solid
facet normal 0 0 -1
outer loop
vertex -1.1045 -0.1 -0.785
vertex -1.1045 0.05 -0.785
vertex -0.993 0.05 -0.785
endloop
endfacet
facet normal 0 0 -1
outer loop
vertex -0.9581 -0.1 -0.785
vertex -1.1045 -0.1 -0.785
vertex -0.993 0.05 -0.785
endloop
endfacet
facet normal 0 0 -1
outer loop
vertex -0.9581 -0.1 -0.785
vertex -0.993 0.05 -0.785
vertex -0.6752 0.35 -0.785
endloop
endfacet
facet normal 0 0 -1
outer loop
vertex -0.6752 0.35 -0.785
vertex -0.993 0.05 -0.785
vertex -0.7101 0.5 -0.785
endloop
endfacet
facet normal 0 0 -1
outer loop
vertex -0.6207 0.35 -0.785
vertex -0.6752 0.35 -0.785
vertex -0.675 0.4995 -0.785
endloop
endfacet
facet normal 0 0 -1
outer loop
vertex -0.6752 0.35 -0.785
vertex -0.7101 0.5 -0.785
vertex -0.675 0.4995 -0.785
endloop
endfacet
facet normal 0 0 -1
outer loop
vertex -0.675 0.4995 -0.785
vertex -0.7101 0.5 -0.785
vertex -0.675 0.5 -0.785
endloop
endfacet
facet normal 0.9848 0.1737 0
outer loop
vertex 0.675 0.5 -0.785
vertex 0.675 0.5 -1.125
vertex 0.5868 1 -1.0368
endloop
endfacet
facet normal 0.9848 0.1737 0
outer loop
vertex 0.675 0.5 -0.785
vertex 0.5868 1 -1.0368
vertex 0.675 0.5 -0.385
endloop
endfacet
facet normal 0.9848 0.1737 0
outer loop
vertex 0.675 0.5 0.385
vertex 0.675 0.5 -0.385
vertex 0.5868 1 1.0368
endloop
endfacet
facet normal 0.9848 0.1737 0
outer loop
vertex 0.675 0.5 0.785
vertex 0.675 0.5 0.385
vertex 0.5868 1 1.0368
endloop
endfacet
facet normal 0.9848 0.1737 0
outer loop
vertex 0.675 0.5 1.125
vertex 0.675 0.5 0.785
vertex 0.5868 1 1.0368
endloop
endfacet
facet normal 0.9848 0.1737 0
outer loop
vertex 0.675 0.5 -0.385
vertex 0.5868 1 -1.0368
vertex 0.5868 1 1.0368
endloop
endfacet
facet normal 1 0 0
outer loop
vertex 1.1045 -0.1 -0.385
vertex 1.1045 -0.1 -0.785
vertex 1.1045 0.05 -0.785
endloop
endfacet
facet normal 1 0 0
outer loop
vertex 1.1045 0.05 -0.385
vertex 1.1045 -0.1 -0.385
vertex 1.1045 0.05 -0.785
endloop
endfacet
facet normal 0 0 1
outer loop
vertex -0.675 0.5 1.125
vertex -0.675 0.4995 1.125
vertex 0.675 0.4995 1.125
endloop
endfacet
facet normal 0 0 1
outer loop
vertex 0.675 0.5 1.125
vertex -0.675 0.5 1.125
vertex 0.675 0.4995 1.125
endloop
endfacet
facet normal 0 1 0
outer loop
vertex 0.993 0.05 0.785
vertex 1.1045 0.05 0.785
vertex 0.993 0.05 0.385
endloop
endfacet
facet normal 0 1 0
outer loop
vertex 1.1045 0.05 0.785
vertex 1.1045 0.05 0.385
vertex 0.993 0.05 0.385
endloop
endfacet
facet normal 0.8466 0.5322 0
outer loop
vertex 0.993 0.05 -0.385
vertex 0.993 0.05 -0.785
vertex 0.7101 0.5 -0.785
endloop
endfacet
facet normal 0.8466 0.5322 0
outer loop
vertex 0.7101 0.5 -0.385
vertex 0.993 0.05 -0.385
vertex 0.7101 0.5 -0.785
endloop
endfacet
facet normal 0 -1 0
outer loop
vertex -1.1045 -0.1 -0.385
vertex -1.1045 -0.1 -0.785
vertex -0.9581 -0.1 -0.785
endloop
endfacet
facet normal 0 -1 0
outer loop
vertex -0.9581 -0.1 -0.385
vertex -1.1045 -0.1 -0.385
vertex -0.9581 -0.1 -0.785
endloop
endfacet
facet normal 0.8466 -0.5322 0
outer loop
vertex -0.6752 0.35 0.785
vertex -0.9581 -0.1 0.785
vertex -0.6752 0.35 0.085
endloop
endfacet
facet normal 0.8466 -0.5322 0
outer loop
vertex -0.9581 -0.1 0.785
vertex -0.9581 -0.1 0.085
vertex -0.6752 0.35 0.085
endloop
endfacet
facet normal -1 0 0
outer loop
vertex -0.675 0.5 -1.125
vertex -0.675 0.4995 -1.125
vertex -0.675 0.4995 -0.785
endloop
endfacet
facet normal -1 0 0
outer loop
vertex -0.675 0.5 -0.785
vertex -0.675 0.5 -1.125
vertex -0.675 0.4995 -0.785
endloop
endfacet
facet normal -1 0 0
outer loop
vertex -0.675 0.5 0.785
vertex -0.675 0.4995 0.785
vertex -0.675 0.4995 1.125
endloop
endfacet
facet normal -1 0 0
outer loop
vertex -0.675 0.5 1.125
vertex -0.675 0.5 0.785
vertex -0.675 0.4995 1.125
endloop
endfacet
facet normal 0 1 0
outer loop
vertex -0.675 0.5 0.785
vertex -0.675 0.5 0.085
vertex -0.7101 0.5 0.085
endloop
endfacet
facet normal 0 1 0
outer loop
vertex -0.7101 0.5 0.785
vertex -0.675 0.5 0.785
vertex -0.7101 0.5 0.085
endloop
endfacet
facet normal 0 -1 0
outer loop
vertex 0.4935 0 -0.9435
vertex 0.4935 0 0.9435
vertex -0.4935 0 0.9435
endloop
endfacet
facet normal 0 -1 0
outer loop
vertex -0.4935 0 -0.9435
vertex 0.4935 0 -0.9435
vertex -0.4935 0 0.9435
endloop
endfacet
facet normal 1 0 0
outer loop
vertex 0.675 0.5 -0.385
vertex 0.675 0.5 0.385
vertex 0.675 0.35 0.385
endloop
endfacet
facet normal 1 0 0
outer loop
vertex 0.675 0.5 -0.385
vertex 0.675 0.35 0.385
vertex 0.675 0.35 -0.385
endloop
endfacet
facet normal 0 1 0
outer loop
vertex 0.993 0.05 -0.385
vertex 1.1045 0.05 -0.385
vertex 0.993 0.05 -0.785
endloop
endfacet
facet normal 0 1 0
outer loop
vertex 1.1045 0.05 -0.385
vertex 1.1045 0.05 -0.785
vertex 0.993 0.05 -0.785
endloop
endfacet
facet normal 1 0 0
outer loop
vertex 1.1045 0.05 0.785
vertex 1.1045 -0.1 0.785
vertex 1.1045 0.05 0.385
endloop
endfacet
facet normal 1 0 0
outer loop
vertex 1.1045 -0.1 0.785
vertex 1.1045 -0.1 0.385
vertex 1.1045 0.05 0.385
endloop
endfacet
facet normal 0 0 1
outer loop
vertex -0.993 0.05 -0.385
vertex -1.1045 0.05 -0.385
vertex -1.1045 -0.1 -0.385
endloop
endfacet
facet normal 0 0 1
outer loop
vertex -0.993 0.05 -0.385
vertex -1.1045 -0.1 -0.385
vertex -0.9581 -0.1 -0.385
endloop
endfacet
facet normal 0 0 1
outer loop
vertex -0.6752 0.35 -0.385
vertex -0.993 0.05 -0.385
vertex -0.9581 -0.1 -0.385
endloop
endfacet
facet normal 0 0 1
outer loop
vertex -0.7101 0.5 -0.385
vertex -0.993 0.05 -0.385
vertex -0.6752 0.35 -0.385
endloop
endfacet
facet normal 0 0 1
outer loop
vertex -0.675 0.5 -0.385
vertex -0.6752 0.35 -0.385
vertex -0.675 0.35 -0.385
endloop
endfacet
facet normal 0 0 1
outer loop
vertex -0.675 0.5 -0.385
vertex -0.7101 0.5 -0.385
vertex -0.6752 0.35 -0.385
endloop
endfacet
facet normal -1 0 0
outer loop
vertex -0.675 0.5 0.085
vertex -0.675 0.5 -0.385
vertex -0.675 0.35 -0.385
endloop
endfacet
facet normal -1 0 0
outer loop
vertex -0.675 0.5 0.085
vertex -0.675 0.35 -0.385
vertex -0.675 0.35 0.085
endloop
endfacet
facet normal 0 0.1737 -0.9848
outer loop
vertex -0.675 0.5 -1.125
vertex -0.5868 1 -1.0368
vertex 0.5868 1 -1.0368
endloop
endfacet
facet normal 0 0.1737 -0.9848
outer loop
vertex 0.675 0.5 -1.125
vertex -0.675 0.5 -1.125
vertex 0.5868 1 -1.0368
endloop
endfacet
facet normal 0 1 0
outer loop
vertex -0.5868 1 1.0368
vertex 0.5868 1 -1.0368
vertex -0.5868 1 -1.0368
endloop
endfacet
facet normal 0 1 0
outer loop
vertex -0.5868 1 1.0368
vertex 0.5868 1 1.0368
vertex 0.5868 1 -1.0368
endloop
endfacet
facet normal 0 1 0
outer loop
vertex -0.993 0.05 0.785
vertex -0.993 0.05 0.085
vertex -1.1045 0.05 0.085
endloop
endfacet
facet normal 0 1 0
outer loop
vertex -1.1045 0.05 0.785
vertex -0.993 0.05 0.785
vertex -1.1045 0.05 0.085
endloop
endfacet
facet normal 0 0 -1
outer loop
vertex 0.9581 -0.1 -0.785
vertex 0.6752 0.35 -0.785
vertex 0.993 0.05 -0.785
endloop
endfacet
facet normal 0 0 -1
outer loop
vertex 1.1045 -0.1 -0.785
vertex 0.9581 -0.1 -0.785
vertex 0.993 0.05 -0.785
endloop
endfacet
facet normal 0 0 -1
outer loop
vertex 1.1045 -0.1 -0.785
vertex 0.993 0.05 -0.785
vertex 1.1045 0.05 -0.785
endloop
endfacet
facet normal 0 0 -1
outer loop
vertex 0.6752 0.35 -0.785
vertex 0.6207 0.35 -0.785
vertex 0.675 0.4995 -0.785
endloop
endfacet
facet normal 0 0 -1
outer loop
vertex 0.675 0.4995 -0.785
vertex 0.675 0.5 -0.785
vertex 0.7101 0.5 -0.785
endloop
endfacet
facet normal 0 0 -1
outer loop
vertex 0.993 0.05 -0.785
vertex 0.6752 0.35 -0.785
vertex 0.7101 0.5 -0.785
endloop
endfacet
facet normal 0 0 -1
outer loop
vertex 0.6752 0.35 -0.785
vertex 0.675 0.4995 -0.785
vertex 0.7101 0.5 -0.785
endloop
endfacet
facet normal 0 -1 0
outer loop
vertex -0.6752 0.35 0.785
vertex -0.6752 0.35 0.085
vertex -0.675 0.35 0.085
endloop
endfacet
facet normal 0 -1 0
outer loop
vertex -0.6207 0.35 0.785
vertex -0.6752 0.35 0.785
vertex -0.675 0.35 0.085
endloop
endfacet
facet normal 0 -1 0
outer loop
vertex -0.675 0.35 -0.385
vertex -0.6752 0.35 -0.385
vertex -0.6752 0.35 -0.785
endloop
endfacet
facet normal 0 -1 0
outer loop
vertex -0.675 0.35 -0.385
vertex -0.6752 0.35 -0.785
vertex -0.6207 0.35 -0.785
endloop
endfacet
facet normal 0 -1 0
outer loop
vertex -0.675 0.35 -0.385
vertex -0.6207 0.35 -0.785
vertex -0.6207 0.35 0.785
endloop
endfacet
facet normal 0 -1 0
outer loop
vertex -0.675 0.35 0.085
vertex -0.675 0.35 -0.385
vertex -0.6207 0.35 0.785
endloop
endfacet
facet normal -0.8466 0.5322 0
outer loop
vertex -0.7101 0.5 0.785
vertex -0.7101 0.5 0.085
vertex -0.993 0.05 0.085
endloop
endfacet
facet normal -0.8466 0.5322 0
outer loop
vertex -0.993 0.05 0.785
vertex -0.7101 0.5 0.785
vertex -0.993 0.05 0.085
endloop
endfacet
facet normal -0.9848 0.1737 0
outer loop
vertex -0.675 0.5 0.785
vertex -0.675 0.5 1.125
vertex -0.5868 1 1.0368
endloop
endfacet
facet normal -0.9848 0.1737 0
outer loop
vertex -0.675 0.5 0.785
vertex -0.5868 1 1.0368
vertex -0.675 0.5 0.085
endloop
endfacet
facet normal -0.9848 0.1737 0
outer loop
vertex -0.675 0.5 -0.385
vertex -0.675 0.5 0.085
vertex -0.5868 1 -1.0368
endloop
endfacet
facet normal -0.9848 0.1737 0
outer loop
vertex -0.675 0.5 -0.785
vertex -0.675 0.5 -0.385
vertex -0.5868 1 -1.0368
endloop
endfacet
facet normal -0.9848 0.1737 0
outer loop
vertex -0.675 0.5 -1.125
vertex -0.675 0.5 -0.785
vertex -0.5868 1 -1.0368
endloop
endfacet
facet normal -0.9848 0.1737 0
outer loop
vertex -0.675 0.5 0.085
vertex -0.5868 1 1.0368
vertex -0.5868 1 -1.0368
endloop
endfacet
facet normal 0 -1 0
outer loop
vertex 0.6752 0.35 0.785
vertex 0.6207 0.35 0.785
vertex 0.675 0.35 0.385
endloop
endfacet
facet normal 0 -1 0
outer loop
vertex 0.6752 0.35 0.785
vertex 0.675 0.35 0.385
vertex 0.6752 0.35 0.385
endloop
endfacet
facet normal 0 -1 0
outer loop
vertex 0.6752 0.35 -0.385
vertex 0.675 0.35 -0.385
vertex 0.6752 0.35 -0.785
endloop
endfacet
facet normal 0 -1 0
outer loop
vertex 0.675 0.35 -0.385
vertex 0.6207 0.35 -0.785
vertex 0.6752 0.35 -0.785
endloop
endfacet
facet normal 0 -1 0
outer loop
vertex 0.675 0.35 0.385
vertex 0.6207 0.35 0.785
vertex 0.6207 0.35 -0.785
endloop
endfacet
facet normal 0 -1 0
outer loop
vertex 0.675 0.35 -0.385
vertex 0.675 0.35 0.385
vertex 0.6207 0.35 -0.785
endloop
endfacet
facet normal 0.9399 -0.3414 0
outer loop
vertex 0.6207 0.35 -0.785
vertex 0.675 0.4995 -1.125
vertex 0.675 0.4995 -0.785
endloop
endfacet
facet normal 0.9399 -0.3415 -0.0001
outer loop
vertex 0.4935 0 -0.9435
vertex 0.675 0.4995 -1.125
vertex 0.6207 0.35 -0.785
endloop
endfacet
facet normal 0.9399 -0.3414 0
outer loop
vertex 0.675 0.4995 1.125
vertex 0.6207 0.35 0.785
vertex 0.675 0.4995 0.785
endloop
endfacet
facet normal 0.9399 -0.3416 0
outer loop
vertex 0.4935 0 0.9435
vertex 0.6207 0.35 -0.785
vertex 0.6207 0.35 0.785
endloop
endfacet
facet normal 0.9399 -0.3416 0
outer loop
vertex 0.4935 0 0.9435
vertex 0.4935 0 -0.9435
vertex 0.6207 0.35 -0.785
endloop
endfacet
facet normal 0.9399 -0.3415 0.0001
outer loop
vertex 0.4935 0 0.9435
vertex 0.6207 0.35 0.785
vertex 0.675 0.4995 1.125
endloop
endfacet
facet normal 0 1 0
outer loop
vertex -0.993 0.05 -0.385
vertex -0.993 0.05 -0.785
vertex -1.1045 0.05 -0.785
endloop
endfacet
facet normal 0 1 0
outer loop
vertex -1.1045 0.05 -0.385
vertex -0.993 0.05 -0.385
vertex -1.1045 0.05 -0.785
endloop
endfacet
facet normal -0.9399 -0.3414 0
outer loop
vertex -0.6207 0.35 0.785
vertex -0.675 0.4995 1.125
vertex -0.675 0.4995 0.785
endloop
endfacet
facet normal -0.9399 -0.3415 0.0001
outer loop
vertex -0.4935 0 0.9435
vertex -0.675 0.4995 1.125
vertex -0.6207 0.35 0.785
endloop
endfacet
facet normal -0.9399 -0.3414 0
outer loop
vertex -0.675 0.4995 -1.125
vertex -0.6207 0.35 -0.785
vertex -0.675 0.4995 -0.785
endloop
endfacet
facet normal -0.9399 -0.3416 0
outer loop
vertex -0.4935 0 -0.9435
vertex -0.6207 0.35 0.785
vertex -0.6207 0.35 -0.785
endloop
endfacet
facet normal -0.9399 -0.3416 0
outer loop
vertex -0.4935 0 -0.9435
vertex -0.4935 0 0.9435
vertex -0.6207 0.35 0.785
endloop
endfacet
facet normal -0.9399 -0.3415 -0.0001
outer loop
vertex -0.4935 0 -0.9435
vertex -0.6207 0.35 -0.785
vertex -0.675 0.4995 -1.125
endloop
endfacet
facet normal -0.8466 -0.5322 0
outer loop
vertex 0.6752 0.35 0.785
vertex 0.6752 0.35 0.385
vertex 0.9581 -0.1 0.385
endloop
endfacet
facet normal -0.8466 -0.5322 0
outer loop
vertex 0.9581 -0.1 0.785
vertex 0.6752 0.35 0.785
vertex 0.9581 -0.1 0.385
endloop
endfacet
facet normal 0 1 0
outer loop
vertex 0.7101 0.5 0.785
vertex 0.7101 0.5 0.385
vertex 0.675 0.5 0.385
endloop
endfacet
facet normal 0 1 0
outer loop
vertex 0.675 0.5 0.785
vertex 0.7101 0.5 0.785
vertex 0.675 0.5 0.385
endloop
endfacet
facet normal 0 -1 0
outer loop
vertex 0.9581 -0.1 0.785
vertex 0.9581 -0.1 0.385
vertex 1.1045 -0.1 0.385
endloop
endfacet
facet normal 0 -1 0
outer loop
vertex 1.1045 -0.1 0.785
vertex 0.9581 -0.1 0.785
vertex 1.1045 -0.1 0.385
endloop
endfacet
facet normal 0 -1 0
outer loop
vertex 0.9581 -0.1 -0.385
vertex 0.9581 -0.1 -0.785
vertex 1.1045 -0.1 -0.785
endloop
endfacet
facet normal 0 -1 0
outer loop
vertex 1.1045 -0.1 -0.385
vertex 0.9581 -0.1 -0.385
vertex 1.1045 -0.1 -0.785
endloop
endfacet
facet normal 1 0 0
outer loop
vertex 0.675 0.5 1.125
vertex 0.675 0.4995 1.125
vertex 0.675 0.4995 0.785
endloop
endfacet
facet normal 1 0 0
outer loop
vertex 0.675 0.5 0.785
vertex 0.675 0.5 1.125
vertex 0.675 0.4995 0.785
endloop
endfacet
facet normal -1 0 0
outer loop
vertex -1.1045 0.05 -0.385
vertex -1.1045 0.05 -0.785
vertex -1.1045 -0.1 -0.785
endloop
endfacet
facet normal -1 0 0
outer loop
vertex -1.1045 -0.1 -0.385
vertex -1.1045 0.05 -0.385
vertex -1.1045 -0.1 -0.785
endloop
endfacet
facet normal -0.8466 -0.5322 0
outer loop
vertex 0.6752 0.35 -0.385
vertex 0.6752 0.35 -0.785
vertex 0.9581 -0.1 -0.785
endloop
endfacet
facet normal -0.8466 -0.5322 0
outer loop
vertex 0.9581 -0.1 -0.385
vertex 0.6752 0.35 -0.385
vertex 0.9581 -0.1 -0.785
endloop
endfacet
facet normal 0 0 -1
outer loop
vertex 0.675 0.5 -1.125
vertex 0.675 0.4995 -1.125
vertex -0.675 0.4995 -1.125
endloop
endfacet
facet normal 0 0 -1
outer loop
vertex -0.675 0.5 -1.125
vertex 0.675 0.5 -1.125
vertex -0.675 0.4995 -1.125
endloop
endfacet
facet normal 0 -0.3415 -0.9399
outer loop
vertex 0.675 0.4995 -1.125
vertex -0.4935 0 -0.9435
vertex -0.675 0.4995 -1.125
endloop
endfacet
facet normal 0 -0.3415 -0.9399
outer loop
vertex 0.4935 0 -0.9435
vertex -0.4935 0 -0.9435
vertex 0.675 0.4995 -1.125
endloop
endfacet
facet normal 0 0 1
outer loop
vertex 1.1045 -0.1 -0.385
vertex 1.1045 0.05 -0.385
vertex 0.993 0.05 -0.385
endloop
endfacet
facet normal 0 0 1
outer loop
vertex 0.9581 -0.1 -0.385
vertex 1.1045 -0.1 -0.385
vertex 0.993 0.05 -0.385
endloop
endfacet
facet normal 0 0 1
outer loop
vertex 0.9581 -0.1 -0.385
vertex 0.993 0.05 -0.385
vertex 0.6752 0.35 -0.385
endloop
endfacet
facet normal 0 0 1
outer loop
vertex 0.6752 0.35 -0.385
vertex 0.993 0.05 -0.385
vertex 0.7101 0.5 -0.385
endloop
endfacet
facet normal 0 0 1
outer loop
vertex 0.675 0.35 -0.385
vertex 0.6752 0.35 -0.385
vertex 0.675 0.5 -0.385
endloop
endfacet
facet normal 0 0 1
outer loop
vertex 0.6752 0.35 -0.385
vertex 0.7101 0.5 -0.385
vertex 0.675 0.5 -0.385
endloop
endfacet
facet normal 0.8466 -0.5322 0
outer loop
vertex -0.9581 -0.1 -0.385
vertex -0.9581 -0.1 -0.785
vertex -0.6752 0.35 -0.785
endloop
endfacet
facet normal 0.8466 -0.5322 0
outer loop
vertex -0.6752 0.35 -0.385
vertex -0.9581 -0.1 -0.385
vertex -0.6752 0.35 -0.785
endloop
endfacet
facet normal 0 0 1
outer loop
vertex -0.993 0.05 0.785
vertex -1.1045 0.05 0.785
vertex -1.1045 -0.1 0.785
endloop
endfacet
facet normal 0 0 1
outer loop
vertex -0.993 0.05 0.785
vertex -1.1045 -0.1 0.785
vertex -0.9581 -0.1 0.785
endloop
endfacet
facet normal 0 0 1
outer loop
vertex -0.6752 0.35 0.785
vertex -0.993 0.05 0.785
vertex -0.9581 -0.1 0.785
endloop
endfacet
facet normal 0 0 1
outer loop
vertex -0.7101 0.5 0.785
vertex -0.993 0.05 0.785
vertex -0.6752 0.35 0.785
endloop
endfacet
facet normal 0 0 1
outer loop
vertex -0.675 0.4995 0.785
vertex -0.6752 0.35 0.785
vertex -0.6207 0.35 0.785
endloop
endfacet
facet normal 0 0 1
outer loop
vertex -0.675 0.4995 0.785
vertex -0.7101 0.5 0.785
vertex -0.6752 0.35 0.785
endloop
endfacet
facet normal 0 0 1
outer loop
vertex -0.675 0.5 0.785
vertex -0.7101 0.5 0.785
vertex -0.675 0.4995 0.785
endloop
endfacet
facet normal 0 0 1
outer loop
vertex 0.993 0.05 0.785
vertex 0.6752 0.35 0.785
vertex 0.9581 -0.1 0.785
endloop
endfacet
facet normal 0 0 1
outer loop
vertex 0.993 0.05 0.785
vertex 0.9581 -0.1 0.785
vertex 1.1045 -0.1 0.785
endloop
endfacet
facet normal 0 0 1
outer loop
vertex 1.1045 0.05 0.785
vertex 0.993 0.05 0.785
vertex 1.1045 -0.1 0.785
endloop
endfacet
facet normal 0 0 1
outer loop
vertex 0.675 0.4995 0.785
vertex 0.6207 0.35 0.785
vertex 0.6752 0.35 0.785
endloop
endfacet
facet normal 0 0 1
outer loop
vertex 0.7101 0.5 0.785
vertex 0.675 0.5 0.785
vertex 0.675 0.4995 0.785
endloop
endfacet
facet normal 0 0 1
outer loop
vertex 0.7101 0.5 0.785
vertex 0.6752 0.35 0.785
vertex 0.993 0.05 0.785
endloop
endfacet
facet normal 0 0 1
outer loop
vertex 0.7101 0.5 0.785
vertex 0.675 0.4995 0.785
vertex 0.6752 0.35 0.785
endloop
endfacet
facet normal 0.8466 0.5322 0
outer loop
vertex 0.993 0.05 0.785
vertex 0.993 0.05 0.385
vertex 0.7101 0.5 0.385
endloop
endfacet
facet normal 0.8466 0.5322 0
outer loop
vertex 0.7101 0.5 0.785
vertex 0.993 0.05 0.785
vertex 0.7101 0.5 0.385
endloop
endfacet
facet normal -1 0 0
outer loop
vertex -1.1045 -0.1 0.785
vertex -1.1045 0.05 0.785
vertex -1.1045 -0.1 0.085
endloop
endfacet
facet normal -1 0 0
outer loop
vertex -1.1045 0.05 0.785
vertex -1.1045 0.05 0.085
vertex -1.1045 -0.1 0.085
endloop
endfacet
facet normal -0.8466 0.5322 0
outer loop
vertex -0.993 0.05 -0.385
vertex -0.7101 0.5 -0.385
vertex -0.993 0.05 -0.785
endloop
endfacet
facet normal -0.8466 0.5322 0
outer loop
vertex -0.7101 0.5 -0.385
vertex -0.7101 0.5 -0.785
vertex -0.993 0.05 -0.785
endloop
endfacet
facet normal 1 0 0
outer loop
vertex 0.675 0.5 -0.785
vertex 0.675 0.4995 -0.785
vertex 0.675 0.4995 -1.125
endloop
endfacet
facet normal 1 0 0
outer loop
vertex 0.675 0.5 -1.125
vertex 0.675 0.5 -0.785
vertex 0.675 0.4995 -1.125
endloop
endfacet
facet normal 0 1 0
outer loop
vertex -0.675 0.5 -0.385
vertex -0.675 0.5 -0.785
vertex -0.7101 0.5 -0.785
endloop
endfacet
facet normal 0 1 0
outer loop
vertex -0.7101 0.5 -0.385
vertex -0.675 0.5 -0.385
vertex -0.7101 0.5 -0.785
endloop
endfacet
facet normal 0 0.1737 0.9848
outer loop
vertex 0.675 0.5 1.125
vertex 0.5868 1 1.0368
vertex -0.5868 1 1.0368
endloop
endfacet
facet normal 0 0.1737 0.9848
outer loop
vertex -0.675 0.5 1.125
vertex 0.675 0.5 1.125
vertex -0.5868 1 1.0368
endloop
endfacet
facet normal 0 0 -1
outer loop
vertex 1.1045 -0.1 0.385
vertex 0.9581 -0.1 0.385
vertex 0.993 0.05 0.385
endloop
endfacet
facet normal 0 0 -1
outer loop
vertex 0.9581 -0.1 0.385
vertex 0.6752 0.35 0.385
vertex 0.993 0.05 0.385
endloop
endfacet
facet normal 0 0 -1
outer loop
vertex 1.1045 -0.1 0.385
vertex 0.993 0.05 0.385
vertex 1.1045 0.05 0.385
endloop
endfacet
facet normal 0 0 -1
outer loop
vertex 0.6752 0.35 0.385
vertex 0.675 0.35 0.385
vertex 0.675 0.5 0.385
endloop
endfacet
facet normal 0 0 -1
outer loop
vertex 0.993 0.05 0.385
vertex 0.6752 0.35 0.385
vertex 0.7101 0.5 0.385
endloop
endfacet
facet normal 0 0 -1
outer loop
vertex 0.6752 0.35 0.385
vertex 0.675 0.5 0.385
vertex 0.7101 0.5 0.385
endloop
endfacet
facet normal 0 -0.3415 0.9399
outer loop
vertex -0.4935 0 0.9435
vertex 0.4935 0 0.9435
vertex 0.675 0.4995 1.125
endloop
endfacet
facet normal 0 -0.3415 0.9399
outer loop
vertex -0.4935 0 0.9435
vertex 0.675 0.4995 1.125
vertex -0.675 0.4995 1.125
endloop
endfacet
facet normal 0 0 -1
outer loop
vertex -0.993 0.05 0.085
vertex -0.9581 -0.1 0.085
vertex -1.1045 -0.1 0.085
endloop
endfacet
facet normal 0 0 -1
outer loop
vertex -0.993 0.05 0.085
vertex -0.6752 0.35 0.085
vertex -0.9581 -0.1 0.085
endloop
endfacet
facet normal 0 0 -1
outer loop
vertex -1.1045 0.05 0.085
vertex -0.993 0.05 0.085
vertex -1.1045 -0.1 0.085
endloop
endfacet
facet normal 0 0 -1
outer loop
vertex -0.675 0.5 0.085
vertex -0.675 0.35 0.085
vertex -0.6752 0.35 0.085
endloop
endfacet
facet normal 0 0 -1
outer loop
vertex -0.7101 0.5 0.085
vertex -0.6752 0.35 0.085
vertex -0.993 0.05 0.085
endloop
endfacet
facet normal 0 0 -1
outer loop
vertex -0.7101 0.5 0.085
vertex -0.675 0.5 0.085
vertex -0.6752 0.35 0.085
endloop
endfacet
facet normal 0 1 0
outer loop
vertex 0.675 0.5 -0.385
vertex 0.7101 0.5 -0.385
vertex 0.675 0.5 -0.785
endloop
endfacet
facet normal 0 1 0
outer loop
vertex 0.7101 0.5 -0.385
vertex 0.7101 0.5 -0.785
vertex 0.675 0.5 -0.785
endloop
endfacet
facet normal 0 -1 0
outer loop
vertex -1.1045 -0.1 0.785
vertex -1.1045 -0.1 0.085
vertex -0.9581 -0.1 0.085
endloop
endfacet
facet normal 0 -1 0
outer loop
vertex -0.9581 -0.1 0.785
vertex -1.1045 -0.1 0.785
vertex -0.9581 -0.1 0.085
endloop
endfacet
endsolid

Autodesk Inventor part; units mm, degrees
ref_plane "YZ Plane" through (0, 0, 0) normal (1, 0, 0) x (0, 1, 0)
ref_plane "XZ Plane" through (0, 0, 0) normal (0, 1, 0) x (-1, 0, 0)
ref_plane "XY Plane" through (0, 0, 0) normal (0, 0, 1) x (1, 0, 0)
sketch "Sketch1" plane through (0, 0, 0) normal (0, 1, 0) x (-1, 0, 0)
  line L0 (0.675, 1.125) -> (-0.675, 1.125)
  line L1 (-0.675, 1.125) -> (-0.675, -1.125)
  line L2 (-0.675, -1.125) -> (0.675, -1.125)
  line L3 (0.675, -1.125) -> (0.675, 1.125)
  point P0 (0, 0)
  dimension "d0" = 1.35
  dimension "d1" = 0.675
  dimension "d2" = 2.25
  dimension "d3" = 1.125
extrude "Extrusion1" add sketch "Sketch1" along normal blind 1
chamfer "Chamfer1" distance 0.5 angle 10 1 edges at (0.675, 1, 0) measured on face at (0.675, 0.3333, 0.375)
chamfer "Chamfer2" distance 0.5 angle 10 1 edges at (-0.0441, 1, 1.125) measured on face at (-0.225, 0.5, 1.125)
chamfer "Chamfer3" distance 0.5 angle 10 1 edges at (-0.0441, 1, -1.125) measured on face at (-0.225, 0.5, -1.125)
chamfer "Chamfer4" distance 0.5 angle 10 1 edges at (-0.675, 1, 0) measured on face at (-0.675, 0.1667, -0.375)
chamfer "Chamfer5" distance 0.5 angle 20 1 edges at (-0.675, 0, 0) measured on face at (-0.675, 0.3333, 0.375)
chamfer "Chamfer6" distance 0.5 angle 20 1 edges at (0.0907, 0, -1.125) measured on face at (-0.1645, 0.3332, -1.125)
chamfer "Chamfer7" distance 0.5 angle 20 1 edges at (0.675, 0, 0.0907) measured on face at (0.675, 0.3333, -0.3145)
chamfer "Chamfer8" distance 0.5 angle 20 1 edges at (0, 0, 1.125) measured on face at (0.1645, 0.333, 1.125)
sketch "Sketch2" plane through (0, 0, 0) normal (0, 0, 1) x (1, 0, 0)
  line L0 (-0.6745, 0.5) -> (-0.7101, 0.5)
  line L1 (-0.7101, 0.5) -> (-0.993, 0.05)
  line L2 (-0.993, 0.05) -> (-1.1045, 0.05)
  line L3 (-1.1045, 0.05) -> (-1.1045, -0.1)
  line L4 (-1.1045, -0.1) -> (-0.9581, -0.1)
  line L5 (-0.9581, -0.1) -> (-0.6752, 0.35)
  line L6 (-0.6752, 0.35) -> (-0.6745, 0.35)
  line L7 (-0.6745, 0.35) -> (-0.6745, 0.5)
  line L8 (-0.493, 0) -> (0.493, 0) projected
  line L9 (-0.6745, 0.35) -> (-0.5079, 0.35)
  line L10 (-0.5079, 0.35) -> (-0.5079, 0.5)
  line L11 (-0.5079, 0.5) -> (-0.6745, 0.5)
  line L12 (-0.6745, 0.5) -> (-0.6745, 0.35)
  point P0 (0, 0)
  dimension "d30" = 0.15
  dimension "d31" = 0.15
  dimension "d32" = 0.1
  dimension "d33" = 0.43
  dimension "d34" = 0.5
extrude "Extrusion2" add sketch "Sketch2" along normal mid plane 1.57
mirror "Mirror1" about plane through (0, 0, 0) normal (1, 0, 0) of "Extrusion2"
sketch "Sketch3" plane through (0, 1, 0) normal (0, 1, 0) x (1, 0, 0)
  line L0 (0.675, -0.785) -> (0.675, 0.785) projected
  line L1 (1.3066, 0.385) -> (0.675, 0.385)
  line L2 (0.675, 0.385) -> (0.675, -0.385)
  line L3 (0.675, -0.385) -> (1.3066, -0.385)
  line L4 (1.3066, -0.385) -> (1.3066, 0.385)
  line L5 (-0.675, 0.785) -> (-0.675, -0.785) projected
  line L6 (-0.675, -0.085) -> (-1.3547, -0.085)
  line L7 (-1.3547, -0.085) -> (-1.3547, 0.385)
  line L8 (-1.3547, 0.385) -> (-0.675, 0.385)
  line L9 (-0.675, 0.385) -> (-0.675, -0.085)
  line L10 (-0.993, 0.785) -> (-0.7101, 0.785) projected
  point P0 (0, 0)
  dimension "d38" = 0.77
  dimension "d39" = 0.385
  dimension "d40" = 0.47
  dimension "d41" = 0.4
extrude "Extrusion3" cut sketch "Sketch3" against normal blind 1.57
properties part number "MC_MMM1362"
